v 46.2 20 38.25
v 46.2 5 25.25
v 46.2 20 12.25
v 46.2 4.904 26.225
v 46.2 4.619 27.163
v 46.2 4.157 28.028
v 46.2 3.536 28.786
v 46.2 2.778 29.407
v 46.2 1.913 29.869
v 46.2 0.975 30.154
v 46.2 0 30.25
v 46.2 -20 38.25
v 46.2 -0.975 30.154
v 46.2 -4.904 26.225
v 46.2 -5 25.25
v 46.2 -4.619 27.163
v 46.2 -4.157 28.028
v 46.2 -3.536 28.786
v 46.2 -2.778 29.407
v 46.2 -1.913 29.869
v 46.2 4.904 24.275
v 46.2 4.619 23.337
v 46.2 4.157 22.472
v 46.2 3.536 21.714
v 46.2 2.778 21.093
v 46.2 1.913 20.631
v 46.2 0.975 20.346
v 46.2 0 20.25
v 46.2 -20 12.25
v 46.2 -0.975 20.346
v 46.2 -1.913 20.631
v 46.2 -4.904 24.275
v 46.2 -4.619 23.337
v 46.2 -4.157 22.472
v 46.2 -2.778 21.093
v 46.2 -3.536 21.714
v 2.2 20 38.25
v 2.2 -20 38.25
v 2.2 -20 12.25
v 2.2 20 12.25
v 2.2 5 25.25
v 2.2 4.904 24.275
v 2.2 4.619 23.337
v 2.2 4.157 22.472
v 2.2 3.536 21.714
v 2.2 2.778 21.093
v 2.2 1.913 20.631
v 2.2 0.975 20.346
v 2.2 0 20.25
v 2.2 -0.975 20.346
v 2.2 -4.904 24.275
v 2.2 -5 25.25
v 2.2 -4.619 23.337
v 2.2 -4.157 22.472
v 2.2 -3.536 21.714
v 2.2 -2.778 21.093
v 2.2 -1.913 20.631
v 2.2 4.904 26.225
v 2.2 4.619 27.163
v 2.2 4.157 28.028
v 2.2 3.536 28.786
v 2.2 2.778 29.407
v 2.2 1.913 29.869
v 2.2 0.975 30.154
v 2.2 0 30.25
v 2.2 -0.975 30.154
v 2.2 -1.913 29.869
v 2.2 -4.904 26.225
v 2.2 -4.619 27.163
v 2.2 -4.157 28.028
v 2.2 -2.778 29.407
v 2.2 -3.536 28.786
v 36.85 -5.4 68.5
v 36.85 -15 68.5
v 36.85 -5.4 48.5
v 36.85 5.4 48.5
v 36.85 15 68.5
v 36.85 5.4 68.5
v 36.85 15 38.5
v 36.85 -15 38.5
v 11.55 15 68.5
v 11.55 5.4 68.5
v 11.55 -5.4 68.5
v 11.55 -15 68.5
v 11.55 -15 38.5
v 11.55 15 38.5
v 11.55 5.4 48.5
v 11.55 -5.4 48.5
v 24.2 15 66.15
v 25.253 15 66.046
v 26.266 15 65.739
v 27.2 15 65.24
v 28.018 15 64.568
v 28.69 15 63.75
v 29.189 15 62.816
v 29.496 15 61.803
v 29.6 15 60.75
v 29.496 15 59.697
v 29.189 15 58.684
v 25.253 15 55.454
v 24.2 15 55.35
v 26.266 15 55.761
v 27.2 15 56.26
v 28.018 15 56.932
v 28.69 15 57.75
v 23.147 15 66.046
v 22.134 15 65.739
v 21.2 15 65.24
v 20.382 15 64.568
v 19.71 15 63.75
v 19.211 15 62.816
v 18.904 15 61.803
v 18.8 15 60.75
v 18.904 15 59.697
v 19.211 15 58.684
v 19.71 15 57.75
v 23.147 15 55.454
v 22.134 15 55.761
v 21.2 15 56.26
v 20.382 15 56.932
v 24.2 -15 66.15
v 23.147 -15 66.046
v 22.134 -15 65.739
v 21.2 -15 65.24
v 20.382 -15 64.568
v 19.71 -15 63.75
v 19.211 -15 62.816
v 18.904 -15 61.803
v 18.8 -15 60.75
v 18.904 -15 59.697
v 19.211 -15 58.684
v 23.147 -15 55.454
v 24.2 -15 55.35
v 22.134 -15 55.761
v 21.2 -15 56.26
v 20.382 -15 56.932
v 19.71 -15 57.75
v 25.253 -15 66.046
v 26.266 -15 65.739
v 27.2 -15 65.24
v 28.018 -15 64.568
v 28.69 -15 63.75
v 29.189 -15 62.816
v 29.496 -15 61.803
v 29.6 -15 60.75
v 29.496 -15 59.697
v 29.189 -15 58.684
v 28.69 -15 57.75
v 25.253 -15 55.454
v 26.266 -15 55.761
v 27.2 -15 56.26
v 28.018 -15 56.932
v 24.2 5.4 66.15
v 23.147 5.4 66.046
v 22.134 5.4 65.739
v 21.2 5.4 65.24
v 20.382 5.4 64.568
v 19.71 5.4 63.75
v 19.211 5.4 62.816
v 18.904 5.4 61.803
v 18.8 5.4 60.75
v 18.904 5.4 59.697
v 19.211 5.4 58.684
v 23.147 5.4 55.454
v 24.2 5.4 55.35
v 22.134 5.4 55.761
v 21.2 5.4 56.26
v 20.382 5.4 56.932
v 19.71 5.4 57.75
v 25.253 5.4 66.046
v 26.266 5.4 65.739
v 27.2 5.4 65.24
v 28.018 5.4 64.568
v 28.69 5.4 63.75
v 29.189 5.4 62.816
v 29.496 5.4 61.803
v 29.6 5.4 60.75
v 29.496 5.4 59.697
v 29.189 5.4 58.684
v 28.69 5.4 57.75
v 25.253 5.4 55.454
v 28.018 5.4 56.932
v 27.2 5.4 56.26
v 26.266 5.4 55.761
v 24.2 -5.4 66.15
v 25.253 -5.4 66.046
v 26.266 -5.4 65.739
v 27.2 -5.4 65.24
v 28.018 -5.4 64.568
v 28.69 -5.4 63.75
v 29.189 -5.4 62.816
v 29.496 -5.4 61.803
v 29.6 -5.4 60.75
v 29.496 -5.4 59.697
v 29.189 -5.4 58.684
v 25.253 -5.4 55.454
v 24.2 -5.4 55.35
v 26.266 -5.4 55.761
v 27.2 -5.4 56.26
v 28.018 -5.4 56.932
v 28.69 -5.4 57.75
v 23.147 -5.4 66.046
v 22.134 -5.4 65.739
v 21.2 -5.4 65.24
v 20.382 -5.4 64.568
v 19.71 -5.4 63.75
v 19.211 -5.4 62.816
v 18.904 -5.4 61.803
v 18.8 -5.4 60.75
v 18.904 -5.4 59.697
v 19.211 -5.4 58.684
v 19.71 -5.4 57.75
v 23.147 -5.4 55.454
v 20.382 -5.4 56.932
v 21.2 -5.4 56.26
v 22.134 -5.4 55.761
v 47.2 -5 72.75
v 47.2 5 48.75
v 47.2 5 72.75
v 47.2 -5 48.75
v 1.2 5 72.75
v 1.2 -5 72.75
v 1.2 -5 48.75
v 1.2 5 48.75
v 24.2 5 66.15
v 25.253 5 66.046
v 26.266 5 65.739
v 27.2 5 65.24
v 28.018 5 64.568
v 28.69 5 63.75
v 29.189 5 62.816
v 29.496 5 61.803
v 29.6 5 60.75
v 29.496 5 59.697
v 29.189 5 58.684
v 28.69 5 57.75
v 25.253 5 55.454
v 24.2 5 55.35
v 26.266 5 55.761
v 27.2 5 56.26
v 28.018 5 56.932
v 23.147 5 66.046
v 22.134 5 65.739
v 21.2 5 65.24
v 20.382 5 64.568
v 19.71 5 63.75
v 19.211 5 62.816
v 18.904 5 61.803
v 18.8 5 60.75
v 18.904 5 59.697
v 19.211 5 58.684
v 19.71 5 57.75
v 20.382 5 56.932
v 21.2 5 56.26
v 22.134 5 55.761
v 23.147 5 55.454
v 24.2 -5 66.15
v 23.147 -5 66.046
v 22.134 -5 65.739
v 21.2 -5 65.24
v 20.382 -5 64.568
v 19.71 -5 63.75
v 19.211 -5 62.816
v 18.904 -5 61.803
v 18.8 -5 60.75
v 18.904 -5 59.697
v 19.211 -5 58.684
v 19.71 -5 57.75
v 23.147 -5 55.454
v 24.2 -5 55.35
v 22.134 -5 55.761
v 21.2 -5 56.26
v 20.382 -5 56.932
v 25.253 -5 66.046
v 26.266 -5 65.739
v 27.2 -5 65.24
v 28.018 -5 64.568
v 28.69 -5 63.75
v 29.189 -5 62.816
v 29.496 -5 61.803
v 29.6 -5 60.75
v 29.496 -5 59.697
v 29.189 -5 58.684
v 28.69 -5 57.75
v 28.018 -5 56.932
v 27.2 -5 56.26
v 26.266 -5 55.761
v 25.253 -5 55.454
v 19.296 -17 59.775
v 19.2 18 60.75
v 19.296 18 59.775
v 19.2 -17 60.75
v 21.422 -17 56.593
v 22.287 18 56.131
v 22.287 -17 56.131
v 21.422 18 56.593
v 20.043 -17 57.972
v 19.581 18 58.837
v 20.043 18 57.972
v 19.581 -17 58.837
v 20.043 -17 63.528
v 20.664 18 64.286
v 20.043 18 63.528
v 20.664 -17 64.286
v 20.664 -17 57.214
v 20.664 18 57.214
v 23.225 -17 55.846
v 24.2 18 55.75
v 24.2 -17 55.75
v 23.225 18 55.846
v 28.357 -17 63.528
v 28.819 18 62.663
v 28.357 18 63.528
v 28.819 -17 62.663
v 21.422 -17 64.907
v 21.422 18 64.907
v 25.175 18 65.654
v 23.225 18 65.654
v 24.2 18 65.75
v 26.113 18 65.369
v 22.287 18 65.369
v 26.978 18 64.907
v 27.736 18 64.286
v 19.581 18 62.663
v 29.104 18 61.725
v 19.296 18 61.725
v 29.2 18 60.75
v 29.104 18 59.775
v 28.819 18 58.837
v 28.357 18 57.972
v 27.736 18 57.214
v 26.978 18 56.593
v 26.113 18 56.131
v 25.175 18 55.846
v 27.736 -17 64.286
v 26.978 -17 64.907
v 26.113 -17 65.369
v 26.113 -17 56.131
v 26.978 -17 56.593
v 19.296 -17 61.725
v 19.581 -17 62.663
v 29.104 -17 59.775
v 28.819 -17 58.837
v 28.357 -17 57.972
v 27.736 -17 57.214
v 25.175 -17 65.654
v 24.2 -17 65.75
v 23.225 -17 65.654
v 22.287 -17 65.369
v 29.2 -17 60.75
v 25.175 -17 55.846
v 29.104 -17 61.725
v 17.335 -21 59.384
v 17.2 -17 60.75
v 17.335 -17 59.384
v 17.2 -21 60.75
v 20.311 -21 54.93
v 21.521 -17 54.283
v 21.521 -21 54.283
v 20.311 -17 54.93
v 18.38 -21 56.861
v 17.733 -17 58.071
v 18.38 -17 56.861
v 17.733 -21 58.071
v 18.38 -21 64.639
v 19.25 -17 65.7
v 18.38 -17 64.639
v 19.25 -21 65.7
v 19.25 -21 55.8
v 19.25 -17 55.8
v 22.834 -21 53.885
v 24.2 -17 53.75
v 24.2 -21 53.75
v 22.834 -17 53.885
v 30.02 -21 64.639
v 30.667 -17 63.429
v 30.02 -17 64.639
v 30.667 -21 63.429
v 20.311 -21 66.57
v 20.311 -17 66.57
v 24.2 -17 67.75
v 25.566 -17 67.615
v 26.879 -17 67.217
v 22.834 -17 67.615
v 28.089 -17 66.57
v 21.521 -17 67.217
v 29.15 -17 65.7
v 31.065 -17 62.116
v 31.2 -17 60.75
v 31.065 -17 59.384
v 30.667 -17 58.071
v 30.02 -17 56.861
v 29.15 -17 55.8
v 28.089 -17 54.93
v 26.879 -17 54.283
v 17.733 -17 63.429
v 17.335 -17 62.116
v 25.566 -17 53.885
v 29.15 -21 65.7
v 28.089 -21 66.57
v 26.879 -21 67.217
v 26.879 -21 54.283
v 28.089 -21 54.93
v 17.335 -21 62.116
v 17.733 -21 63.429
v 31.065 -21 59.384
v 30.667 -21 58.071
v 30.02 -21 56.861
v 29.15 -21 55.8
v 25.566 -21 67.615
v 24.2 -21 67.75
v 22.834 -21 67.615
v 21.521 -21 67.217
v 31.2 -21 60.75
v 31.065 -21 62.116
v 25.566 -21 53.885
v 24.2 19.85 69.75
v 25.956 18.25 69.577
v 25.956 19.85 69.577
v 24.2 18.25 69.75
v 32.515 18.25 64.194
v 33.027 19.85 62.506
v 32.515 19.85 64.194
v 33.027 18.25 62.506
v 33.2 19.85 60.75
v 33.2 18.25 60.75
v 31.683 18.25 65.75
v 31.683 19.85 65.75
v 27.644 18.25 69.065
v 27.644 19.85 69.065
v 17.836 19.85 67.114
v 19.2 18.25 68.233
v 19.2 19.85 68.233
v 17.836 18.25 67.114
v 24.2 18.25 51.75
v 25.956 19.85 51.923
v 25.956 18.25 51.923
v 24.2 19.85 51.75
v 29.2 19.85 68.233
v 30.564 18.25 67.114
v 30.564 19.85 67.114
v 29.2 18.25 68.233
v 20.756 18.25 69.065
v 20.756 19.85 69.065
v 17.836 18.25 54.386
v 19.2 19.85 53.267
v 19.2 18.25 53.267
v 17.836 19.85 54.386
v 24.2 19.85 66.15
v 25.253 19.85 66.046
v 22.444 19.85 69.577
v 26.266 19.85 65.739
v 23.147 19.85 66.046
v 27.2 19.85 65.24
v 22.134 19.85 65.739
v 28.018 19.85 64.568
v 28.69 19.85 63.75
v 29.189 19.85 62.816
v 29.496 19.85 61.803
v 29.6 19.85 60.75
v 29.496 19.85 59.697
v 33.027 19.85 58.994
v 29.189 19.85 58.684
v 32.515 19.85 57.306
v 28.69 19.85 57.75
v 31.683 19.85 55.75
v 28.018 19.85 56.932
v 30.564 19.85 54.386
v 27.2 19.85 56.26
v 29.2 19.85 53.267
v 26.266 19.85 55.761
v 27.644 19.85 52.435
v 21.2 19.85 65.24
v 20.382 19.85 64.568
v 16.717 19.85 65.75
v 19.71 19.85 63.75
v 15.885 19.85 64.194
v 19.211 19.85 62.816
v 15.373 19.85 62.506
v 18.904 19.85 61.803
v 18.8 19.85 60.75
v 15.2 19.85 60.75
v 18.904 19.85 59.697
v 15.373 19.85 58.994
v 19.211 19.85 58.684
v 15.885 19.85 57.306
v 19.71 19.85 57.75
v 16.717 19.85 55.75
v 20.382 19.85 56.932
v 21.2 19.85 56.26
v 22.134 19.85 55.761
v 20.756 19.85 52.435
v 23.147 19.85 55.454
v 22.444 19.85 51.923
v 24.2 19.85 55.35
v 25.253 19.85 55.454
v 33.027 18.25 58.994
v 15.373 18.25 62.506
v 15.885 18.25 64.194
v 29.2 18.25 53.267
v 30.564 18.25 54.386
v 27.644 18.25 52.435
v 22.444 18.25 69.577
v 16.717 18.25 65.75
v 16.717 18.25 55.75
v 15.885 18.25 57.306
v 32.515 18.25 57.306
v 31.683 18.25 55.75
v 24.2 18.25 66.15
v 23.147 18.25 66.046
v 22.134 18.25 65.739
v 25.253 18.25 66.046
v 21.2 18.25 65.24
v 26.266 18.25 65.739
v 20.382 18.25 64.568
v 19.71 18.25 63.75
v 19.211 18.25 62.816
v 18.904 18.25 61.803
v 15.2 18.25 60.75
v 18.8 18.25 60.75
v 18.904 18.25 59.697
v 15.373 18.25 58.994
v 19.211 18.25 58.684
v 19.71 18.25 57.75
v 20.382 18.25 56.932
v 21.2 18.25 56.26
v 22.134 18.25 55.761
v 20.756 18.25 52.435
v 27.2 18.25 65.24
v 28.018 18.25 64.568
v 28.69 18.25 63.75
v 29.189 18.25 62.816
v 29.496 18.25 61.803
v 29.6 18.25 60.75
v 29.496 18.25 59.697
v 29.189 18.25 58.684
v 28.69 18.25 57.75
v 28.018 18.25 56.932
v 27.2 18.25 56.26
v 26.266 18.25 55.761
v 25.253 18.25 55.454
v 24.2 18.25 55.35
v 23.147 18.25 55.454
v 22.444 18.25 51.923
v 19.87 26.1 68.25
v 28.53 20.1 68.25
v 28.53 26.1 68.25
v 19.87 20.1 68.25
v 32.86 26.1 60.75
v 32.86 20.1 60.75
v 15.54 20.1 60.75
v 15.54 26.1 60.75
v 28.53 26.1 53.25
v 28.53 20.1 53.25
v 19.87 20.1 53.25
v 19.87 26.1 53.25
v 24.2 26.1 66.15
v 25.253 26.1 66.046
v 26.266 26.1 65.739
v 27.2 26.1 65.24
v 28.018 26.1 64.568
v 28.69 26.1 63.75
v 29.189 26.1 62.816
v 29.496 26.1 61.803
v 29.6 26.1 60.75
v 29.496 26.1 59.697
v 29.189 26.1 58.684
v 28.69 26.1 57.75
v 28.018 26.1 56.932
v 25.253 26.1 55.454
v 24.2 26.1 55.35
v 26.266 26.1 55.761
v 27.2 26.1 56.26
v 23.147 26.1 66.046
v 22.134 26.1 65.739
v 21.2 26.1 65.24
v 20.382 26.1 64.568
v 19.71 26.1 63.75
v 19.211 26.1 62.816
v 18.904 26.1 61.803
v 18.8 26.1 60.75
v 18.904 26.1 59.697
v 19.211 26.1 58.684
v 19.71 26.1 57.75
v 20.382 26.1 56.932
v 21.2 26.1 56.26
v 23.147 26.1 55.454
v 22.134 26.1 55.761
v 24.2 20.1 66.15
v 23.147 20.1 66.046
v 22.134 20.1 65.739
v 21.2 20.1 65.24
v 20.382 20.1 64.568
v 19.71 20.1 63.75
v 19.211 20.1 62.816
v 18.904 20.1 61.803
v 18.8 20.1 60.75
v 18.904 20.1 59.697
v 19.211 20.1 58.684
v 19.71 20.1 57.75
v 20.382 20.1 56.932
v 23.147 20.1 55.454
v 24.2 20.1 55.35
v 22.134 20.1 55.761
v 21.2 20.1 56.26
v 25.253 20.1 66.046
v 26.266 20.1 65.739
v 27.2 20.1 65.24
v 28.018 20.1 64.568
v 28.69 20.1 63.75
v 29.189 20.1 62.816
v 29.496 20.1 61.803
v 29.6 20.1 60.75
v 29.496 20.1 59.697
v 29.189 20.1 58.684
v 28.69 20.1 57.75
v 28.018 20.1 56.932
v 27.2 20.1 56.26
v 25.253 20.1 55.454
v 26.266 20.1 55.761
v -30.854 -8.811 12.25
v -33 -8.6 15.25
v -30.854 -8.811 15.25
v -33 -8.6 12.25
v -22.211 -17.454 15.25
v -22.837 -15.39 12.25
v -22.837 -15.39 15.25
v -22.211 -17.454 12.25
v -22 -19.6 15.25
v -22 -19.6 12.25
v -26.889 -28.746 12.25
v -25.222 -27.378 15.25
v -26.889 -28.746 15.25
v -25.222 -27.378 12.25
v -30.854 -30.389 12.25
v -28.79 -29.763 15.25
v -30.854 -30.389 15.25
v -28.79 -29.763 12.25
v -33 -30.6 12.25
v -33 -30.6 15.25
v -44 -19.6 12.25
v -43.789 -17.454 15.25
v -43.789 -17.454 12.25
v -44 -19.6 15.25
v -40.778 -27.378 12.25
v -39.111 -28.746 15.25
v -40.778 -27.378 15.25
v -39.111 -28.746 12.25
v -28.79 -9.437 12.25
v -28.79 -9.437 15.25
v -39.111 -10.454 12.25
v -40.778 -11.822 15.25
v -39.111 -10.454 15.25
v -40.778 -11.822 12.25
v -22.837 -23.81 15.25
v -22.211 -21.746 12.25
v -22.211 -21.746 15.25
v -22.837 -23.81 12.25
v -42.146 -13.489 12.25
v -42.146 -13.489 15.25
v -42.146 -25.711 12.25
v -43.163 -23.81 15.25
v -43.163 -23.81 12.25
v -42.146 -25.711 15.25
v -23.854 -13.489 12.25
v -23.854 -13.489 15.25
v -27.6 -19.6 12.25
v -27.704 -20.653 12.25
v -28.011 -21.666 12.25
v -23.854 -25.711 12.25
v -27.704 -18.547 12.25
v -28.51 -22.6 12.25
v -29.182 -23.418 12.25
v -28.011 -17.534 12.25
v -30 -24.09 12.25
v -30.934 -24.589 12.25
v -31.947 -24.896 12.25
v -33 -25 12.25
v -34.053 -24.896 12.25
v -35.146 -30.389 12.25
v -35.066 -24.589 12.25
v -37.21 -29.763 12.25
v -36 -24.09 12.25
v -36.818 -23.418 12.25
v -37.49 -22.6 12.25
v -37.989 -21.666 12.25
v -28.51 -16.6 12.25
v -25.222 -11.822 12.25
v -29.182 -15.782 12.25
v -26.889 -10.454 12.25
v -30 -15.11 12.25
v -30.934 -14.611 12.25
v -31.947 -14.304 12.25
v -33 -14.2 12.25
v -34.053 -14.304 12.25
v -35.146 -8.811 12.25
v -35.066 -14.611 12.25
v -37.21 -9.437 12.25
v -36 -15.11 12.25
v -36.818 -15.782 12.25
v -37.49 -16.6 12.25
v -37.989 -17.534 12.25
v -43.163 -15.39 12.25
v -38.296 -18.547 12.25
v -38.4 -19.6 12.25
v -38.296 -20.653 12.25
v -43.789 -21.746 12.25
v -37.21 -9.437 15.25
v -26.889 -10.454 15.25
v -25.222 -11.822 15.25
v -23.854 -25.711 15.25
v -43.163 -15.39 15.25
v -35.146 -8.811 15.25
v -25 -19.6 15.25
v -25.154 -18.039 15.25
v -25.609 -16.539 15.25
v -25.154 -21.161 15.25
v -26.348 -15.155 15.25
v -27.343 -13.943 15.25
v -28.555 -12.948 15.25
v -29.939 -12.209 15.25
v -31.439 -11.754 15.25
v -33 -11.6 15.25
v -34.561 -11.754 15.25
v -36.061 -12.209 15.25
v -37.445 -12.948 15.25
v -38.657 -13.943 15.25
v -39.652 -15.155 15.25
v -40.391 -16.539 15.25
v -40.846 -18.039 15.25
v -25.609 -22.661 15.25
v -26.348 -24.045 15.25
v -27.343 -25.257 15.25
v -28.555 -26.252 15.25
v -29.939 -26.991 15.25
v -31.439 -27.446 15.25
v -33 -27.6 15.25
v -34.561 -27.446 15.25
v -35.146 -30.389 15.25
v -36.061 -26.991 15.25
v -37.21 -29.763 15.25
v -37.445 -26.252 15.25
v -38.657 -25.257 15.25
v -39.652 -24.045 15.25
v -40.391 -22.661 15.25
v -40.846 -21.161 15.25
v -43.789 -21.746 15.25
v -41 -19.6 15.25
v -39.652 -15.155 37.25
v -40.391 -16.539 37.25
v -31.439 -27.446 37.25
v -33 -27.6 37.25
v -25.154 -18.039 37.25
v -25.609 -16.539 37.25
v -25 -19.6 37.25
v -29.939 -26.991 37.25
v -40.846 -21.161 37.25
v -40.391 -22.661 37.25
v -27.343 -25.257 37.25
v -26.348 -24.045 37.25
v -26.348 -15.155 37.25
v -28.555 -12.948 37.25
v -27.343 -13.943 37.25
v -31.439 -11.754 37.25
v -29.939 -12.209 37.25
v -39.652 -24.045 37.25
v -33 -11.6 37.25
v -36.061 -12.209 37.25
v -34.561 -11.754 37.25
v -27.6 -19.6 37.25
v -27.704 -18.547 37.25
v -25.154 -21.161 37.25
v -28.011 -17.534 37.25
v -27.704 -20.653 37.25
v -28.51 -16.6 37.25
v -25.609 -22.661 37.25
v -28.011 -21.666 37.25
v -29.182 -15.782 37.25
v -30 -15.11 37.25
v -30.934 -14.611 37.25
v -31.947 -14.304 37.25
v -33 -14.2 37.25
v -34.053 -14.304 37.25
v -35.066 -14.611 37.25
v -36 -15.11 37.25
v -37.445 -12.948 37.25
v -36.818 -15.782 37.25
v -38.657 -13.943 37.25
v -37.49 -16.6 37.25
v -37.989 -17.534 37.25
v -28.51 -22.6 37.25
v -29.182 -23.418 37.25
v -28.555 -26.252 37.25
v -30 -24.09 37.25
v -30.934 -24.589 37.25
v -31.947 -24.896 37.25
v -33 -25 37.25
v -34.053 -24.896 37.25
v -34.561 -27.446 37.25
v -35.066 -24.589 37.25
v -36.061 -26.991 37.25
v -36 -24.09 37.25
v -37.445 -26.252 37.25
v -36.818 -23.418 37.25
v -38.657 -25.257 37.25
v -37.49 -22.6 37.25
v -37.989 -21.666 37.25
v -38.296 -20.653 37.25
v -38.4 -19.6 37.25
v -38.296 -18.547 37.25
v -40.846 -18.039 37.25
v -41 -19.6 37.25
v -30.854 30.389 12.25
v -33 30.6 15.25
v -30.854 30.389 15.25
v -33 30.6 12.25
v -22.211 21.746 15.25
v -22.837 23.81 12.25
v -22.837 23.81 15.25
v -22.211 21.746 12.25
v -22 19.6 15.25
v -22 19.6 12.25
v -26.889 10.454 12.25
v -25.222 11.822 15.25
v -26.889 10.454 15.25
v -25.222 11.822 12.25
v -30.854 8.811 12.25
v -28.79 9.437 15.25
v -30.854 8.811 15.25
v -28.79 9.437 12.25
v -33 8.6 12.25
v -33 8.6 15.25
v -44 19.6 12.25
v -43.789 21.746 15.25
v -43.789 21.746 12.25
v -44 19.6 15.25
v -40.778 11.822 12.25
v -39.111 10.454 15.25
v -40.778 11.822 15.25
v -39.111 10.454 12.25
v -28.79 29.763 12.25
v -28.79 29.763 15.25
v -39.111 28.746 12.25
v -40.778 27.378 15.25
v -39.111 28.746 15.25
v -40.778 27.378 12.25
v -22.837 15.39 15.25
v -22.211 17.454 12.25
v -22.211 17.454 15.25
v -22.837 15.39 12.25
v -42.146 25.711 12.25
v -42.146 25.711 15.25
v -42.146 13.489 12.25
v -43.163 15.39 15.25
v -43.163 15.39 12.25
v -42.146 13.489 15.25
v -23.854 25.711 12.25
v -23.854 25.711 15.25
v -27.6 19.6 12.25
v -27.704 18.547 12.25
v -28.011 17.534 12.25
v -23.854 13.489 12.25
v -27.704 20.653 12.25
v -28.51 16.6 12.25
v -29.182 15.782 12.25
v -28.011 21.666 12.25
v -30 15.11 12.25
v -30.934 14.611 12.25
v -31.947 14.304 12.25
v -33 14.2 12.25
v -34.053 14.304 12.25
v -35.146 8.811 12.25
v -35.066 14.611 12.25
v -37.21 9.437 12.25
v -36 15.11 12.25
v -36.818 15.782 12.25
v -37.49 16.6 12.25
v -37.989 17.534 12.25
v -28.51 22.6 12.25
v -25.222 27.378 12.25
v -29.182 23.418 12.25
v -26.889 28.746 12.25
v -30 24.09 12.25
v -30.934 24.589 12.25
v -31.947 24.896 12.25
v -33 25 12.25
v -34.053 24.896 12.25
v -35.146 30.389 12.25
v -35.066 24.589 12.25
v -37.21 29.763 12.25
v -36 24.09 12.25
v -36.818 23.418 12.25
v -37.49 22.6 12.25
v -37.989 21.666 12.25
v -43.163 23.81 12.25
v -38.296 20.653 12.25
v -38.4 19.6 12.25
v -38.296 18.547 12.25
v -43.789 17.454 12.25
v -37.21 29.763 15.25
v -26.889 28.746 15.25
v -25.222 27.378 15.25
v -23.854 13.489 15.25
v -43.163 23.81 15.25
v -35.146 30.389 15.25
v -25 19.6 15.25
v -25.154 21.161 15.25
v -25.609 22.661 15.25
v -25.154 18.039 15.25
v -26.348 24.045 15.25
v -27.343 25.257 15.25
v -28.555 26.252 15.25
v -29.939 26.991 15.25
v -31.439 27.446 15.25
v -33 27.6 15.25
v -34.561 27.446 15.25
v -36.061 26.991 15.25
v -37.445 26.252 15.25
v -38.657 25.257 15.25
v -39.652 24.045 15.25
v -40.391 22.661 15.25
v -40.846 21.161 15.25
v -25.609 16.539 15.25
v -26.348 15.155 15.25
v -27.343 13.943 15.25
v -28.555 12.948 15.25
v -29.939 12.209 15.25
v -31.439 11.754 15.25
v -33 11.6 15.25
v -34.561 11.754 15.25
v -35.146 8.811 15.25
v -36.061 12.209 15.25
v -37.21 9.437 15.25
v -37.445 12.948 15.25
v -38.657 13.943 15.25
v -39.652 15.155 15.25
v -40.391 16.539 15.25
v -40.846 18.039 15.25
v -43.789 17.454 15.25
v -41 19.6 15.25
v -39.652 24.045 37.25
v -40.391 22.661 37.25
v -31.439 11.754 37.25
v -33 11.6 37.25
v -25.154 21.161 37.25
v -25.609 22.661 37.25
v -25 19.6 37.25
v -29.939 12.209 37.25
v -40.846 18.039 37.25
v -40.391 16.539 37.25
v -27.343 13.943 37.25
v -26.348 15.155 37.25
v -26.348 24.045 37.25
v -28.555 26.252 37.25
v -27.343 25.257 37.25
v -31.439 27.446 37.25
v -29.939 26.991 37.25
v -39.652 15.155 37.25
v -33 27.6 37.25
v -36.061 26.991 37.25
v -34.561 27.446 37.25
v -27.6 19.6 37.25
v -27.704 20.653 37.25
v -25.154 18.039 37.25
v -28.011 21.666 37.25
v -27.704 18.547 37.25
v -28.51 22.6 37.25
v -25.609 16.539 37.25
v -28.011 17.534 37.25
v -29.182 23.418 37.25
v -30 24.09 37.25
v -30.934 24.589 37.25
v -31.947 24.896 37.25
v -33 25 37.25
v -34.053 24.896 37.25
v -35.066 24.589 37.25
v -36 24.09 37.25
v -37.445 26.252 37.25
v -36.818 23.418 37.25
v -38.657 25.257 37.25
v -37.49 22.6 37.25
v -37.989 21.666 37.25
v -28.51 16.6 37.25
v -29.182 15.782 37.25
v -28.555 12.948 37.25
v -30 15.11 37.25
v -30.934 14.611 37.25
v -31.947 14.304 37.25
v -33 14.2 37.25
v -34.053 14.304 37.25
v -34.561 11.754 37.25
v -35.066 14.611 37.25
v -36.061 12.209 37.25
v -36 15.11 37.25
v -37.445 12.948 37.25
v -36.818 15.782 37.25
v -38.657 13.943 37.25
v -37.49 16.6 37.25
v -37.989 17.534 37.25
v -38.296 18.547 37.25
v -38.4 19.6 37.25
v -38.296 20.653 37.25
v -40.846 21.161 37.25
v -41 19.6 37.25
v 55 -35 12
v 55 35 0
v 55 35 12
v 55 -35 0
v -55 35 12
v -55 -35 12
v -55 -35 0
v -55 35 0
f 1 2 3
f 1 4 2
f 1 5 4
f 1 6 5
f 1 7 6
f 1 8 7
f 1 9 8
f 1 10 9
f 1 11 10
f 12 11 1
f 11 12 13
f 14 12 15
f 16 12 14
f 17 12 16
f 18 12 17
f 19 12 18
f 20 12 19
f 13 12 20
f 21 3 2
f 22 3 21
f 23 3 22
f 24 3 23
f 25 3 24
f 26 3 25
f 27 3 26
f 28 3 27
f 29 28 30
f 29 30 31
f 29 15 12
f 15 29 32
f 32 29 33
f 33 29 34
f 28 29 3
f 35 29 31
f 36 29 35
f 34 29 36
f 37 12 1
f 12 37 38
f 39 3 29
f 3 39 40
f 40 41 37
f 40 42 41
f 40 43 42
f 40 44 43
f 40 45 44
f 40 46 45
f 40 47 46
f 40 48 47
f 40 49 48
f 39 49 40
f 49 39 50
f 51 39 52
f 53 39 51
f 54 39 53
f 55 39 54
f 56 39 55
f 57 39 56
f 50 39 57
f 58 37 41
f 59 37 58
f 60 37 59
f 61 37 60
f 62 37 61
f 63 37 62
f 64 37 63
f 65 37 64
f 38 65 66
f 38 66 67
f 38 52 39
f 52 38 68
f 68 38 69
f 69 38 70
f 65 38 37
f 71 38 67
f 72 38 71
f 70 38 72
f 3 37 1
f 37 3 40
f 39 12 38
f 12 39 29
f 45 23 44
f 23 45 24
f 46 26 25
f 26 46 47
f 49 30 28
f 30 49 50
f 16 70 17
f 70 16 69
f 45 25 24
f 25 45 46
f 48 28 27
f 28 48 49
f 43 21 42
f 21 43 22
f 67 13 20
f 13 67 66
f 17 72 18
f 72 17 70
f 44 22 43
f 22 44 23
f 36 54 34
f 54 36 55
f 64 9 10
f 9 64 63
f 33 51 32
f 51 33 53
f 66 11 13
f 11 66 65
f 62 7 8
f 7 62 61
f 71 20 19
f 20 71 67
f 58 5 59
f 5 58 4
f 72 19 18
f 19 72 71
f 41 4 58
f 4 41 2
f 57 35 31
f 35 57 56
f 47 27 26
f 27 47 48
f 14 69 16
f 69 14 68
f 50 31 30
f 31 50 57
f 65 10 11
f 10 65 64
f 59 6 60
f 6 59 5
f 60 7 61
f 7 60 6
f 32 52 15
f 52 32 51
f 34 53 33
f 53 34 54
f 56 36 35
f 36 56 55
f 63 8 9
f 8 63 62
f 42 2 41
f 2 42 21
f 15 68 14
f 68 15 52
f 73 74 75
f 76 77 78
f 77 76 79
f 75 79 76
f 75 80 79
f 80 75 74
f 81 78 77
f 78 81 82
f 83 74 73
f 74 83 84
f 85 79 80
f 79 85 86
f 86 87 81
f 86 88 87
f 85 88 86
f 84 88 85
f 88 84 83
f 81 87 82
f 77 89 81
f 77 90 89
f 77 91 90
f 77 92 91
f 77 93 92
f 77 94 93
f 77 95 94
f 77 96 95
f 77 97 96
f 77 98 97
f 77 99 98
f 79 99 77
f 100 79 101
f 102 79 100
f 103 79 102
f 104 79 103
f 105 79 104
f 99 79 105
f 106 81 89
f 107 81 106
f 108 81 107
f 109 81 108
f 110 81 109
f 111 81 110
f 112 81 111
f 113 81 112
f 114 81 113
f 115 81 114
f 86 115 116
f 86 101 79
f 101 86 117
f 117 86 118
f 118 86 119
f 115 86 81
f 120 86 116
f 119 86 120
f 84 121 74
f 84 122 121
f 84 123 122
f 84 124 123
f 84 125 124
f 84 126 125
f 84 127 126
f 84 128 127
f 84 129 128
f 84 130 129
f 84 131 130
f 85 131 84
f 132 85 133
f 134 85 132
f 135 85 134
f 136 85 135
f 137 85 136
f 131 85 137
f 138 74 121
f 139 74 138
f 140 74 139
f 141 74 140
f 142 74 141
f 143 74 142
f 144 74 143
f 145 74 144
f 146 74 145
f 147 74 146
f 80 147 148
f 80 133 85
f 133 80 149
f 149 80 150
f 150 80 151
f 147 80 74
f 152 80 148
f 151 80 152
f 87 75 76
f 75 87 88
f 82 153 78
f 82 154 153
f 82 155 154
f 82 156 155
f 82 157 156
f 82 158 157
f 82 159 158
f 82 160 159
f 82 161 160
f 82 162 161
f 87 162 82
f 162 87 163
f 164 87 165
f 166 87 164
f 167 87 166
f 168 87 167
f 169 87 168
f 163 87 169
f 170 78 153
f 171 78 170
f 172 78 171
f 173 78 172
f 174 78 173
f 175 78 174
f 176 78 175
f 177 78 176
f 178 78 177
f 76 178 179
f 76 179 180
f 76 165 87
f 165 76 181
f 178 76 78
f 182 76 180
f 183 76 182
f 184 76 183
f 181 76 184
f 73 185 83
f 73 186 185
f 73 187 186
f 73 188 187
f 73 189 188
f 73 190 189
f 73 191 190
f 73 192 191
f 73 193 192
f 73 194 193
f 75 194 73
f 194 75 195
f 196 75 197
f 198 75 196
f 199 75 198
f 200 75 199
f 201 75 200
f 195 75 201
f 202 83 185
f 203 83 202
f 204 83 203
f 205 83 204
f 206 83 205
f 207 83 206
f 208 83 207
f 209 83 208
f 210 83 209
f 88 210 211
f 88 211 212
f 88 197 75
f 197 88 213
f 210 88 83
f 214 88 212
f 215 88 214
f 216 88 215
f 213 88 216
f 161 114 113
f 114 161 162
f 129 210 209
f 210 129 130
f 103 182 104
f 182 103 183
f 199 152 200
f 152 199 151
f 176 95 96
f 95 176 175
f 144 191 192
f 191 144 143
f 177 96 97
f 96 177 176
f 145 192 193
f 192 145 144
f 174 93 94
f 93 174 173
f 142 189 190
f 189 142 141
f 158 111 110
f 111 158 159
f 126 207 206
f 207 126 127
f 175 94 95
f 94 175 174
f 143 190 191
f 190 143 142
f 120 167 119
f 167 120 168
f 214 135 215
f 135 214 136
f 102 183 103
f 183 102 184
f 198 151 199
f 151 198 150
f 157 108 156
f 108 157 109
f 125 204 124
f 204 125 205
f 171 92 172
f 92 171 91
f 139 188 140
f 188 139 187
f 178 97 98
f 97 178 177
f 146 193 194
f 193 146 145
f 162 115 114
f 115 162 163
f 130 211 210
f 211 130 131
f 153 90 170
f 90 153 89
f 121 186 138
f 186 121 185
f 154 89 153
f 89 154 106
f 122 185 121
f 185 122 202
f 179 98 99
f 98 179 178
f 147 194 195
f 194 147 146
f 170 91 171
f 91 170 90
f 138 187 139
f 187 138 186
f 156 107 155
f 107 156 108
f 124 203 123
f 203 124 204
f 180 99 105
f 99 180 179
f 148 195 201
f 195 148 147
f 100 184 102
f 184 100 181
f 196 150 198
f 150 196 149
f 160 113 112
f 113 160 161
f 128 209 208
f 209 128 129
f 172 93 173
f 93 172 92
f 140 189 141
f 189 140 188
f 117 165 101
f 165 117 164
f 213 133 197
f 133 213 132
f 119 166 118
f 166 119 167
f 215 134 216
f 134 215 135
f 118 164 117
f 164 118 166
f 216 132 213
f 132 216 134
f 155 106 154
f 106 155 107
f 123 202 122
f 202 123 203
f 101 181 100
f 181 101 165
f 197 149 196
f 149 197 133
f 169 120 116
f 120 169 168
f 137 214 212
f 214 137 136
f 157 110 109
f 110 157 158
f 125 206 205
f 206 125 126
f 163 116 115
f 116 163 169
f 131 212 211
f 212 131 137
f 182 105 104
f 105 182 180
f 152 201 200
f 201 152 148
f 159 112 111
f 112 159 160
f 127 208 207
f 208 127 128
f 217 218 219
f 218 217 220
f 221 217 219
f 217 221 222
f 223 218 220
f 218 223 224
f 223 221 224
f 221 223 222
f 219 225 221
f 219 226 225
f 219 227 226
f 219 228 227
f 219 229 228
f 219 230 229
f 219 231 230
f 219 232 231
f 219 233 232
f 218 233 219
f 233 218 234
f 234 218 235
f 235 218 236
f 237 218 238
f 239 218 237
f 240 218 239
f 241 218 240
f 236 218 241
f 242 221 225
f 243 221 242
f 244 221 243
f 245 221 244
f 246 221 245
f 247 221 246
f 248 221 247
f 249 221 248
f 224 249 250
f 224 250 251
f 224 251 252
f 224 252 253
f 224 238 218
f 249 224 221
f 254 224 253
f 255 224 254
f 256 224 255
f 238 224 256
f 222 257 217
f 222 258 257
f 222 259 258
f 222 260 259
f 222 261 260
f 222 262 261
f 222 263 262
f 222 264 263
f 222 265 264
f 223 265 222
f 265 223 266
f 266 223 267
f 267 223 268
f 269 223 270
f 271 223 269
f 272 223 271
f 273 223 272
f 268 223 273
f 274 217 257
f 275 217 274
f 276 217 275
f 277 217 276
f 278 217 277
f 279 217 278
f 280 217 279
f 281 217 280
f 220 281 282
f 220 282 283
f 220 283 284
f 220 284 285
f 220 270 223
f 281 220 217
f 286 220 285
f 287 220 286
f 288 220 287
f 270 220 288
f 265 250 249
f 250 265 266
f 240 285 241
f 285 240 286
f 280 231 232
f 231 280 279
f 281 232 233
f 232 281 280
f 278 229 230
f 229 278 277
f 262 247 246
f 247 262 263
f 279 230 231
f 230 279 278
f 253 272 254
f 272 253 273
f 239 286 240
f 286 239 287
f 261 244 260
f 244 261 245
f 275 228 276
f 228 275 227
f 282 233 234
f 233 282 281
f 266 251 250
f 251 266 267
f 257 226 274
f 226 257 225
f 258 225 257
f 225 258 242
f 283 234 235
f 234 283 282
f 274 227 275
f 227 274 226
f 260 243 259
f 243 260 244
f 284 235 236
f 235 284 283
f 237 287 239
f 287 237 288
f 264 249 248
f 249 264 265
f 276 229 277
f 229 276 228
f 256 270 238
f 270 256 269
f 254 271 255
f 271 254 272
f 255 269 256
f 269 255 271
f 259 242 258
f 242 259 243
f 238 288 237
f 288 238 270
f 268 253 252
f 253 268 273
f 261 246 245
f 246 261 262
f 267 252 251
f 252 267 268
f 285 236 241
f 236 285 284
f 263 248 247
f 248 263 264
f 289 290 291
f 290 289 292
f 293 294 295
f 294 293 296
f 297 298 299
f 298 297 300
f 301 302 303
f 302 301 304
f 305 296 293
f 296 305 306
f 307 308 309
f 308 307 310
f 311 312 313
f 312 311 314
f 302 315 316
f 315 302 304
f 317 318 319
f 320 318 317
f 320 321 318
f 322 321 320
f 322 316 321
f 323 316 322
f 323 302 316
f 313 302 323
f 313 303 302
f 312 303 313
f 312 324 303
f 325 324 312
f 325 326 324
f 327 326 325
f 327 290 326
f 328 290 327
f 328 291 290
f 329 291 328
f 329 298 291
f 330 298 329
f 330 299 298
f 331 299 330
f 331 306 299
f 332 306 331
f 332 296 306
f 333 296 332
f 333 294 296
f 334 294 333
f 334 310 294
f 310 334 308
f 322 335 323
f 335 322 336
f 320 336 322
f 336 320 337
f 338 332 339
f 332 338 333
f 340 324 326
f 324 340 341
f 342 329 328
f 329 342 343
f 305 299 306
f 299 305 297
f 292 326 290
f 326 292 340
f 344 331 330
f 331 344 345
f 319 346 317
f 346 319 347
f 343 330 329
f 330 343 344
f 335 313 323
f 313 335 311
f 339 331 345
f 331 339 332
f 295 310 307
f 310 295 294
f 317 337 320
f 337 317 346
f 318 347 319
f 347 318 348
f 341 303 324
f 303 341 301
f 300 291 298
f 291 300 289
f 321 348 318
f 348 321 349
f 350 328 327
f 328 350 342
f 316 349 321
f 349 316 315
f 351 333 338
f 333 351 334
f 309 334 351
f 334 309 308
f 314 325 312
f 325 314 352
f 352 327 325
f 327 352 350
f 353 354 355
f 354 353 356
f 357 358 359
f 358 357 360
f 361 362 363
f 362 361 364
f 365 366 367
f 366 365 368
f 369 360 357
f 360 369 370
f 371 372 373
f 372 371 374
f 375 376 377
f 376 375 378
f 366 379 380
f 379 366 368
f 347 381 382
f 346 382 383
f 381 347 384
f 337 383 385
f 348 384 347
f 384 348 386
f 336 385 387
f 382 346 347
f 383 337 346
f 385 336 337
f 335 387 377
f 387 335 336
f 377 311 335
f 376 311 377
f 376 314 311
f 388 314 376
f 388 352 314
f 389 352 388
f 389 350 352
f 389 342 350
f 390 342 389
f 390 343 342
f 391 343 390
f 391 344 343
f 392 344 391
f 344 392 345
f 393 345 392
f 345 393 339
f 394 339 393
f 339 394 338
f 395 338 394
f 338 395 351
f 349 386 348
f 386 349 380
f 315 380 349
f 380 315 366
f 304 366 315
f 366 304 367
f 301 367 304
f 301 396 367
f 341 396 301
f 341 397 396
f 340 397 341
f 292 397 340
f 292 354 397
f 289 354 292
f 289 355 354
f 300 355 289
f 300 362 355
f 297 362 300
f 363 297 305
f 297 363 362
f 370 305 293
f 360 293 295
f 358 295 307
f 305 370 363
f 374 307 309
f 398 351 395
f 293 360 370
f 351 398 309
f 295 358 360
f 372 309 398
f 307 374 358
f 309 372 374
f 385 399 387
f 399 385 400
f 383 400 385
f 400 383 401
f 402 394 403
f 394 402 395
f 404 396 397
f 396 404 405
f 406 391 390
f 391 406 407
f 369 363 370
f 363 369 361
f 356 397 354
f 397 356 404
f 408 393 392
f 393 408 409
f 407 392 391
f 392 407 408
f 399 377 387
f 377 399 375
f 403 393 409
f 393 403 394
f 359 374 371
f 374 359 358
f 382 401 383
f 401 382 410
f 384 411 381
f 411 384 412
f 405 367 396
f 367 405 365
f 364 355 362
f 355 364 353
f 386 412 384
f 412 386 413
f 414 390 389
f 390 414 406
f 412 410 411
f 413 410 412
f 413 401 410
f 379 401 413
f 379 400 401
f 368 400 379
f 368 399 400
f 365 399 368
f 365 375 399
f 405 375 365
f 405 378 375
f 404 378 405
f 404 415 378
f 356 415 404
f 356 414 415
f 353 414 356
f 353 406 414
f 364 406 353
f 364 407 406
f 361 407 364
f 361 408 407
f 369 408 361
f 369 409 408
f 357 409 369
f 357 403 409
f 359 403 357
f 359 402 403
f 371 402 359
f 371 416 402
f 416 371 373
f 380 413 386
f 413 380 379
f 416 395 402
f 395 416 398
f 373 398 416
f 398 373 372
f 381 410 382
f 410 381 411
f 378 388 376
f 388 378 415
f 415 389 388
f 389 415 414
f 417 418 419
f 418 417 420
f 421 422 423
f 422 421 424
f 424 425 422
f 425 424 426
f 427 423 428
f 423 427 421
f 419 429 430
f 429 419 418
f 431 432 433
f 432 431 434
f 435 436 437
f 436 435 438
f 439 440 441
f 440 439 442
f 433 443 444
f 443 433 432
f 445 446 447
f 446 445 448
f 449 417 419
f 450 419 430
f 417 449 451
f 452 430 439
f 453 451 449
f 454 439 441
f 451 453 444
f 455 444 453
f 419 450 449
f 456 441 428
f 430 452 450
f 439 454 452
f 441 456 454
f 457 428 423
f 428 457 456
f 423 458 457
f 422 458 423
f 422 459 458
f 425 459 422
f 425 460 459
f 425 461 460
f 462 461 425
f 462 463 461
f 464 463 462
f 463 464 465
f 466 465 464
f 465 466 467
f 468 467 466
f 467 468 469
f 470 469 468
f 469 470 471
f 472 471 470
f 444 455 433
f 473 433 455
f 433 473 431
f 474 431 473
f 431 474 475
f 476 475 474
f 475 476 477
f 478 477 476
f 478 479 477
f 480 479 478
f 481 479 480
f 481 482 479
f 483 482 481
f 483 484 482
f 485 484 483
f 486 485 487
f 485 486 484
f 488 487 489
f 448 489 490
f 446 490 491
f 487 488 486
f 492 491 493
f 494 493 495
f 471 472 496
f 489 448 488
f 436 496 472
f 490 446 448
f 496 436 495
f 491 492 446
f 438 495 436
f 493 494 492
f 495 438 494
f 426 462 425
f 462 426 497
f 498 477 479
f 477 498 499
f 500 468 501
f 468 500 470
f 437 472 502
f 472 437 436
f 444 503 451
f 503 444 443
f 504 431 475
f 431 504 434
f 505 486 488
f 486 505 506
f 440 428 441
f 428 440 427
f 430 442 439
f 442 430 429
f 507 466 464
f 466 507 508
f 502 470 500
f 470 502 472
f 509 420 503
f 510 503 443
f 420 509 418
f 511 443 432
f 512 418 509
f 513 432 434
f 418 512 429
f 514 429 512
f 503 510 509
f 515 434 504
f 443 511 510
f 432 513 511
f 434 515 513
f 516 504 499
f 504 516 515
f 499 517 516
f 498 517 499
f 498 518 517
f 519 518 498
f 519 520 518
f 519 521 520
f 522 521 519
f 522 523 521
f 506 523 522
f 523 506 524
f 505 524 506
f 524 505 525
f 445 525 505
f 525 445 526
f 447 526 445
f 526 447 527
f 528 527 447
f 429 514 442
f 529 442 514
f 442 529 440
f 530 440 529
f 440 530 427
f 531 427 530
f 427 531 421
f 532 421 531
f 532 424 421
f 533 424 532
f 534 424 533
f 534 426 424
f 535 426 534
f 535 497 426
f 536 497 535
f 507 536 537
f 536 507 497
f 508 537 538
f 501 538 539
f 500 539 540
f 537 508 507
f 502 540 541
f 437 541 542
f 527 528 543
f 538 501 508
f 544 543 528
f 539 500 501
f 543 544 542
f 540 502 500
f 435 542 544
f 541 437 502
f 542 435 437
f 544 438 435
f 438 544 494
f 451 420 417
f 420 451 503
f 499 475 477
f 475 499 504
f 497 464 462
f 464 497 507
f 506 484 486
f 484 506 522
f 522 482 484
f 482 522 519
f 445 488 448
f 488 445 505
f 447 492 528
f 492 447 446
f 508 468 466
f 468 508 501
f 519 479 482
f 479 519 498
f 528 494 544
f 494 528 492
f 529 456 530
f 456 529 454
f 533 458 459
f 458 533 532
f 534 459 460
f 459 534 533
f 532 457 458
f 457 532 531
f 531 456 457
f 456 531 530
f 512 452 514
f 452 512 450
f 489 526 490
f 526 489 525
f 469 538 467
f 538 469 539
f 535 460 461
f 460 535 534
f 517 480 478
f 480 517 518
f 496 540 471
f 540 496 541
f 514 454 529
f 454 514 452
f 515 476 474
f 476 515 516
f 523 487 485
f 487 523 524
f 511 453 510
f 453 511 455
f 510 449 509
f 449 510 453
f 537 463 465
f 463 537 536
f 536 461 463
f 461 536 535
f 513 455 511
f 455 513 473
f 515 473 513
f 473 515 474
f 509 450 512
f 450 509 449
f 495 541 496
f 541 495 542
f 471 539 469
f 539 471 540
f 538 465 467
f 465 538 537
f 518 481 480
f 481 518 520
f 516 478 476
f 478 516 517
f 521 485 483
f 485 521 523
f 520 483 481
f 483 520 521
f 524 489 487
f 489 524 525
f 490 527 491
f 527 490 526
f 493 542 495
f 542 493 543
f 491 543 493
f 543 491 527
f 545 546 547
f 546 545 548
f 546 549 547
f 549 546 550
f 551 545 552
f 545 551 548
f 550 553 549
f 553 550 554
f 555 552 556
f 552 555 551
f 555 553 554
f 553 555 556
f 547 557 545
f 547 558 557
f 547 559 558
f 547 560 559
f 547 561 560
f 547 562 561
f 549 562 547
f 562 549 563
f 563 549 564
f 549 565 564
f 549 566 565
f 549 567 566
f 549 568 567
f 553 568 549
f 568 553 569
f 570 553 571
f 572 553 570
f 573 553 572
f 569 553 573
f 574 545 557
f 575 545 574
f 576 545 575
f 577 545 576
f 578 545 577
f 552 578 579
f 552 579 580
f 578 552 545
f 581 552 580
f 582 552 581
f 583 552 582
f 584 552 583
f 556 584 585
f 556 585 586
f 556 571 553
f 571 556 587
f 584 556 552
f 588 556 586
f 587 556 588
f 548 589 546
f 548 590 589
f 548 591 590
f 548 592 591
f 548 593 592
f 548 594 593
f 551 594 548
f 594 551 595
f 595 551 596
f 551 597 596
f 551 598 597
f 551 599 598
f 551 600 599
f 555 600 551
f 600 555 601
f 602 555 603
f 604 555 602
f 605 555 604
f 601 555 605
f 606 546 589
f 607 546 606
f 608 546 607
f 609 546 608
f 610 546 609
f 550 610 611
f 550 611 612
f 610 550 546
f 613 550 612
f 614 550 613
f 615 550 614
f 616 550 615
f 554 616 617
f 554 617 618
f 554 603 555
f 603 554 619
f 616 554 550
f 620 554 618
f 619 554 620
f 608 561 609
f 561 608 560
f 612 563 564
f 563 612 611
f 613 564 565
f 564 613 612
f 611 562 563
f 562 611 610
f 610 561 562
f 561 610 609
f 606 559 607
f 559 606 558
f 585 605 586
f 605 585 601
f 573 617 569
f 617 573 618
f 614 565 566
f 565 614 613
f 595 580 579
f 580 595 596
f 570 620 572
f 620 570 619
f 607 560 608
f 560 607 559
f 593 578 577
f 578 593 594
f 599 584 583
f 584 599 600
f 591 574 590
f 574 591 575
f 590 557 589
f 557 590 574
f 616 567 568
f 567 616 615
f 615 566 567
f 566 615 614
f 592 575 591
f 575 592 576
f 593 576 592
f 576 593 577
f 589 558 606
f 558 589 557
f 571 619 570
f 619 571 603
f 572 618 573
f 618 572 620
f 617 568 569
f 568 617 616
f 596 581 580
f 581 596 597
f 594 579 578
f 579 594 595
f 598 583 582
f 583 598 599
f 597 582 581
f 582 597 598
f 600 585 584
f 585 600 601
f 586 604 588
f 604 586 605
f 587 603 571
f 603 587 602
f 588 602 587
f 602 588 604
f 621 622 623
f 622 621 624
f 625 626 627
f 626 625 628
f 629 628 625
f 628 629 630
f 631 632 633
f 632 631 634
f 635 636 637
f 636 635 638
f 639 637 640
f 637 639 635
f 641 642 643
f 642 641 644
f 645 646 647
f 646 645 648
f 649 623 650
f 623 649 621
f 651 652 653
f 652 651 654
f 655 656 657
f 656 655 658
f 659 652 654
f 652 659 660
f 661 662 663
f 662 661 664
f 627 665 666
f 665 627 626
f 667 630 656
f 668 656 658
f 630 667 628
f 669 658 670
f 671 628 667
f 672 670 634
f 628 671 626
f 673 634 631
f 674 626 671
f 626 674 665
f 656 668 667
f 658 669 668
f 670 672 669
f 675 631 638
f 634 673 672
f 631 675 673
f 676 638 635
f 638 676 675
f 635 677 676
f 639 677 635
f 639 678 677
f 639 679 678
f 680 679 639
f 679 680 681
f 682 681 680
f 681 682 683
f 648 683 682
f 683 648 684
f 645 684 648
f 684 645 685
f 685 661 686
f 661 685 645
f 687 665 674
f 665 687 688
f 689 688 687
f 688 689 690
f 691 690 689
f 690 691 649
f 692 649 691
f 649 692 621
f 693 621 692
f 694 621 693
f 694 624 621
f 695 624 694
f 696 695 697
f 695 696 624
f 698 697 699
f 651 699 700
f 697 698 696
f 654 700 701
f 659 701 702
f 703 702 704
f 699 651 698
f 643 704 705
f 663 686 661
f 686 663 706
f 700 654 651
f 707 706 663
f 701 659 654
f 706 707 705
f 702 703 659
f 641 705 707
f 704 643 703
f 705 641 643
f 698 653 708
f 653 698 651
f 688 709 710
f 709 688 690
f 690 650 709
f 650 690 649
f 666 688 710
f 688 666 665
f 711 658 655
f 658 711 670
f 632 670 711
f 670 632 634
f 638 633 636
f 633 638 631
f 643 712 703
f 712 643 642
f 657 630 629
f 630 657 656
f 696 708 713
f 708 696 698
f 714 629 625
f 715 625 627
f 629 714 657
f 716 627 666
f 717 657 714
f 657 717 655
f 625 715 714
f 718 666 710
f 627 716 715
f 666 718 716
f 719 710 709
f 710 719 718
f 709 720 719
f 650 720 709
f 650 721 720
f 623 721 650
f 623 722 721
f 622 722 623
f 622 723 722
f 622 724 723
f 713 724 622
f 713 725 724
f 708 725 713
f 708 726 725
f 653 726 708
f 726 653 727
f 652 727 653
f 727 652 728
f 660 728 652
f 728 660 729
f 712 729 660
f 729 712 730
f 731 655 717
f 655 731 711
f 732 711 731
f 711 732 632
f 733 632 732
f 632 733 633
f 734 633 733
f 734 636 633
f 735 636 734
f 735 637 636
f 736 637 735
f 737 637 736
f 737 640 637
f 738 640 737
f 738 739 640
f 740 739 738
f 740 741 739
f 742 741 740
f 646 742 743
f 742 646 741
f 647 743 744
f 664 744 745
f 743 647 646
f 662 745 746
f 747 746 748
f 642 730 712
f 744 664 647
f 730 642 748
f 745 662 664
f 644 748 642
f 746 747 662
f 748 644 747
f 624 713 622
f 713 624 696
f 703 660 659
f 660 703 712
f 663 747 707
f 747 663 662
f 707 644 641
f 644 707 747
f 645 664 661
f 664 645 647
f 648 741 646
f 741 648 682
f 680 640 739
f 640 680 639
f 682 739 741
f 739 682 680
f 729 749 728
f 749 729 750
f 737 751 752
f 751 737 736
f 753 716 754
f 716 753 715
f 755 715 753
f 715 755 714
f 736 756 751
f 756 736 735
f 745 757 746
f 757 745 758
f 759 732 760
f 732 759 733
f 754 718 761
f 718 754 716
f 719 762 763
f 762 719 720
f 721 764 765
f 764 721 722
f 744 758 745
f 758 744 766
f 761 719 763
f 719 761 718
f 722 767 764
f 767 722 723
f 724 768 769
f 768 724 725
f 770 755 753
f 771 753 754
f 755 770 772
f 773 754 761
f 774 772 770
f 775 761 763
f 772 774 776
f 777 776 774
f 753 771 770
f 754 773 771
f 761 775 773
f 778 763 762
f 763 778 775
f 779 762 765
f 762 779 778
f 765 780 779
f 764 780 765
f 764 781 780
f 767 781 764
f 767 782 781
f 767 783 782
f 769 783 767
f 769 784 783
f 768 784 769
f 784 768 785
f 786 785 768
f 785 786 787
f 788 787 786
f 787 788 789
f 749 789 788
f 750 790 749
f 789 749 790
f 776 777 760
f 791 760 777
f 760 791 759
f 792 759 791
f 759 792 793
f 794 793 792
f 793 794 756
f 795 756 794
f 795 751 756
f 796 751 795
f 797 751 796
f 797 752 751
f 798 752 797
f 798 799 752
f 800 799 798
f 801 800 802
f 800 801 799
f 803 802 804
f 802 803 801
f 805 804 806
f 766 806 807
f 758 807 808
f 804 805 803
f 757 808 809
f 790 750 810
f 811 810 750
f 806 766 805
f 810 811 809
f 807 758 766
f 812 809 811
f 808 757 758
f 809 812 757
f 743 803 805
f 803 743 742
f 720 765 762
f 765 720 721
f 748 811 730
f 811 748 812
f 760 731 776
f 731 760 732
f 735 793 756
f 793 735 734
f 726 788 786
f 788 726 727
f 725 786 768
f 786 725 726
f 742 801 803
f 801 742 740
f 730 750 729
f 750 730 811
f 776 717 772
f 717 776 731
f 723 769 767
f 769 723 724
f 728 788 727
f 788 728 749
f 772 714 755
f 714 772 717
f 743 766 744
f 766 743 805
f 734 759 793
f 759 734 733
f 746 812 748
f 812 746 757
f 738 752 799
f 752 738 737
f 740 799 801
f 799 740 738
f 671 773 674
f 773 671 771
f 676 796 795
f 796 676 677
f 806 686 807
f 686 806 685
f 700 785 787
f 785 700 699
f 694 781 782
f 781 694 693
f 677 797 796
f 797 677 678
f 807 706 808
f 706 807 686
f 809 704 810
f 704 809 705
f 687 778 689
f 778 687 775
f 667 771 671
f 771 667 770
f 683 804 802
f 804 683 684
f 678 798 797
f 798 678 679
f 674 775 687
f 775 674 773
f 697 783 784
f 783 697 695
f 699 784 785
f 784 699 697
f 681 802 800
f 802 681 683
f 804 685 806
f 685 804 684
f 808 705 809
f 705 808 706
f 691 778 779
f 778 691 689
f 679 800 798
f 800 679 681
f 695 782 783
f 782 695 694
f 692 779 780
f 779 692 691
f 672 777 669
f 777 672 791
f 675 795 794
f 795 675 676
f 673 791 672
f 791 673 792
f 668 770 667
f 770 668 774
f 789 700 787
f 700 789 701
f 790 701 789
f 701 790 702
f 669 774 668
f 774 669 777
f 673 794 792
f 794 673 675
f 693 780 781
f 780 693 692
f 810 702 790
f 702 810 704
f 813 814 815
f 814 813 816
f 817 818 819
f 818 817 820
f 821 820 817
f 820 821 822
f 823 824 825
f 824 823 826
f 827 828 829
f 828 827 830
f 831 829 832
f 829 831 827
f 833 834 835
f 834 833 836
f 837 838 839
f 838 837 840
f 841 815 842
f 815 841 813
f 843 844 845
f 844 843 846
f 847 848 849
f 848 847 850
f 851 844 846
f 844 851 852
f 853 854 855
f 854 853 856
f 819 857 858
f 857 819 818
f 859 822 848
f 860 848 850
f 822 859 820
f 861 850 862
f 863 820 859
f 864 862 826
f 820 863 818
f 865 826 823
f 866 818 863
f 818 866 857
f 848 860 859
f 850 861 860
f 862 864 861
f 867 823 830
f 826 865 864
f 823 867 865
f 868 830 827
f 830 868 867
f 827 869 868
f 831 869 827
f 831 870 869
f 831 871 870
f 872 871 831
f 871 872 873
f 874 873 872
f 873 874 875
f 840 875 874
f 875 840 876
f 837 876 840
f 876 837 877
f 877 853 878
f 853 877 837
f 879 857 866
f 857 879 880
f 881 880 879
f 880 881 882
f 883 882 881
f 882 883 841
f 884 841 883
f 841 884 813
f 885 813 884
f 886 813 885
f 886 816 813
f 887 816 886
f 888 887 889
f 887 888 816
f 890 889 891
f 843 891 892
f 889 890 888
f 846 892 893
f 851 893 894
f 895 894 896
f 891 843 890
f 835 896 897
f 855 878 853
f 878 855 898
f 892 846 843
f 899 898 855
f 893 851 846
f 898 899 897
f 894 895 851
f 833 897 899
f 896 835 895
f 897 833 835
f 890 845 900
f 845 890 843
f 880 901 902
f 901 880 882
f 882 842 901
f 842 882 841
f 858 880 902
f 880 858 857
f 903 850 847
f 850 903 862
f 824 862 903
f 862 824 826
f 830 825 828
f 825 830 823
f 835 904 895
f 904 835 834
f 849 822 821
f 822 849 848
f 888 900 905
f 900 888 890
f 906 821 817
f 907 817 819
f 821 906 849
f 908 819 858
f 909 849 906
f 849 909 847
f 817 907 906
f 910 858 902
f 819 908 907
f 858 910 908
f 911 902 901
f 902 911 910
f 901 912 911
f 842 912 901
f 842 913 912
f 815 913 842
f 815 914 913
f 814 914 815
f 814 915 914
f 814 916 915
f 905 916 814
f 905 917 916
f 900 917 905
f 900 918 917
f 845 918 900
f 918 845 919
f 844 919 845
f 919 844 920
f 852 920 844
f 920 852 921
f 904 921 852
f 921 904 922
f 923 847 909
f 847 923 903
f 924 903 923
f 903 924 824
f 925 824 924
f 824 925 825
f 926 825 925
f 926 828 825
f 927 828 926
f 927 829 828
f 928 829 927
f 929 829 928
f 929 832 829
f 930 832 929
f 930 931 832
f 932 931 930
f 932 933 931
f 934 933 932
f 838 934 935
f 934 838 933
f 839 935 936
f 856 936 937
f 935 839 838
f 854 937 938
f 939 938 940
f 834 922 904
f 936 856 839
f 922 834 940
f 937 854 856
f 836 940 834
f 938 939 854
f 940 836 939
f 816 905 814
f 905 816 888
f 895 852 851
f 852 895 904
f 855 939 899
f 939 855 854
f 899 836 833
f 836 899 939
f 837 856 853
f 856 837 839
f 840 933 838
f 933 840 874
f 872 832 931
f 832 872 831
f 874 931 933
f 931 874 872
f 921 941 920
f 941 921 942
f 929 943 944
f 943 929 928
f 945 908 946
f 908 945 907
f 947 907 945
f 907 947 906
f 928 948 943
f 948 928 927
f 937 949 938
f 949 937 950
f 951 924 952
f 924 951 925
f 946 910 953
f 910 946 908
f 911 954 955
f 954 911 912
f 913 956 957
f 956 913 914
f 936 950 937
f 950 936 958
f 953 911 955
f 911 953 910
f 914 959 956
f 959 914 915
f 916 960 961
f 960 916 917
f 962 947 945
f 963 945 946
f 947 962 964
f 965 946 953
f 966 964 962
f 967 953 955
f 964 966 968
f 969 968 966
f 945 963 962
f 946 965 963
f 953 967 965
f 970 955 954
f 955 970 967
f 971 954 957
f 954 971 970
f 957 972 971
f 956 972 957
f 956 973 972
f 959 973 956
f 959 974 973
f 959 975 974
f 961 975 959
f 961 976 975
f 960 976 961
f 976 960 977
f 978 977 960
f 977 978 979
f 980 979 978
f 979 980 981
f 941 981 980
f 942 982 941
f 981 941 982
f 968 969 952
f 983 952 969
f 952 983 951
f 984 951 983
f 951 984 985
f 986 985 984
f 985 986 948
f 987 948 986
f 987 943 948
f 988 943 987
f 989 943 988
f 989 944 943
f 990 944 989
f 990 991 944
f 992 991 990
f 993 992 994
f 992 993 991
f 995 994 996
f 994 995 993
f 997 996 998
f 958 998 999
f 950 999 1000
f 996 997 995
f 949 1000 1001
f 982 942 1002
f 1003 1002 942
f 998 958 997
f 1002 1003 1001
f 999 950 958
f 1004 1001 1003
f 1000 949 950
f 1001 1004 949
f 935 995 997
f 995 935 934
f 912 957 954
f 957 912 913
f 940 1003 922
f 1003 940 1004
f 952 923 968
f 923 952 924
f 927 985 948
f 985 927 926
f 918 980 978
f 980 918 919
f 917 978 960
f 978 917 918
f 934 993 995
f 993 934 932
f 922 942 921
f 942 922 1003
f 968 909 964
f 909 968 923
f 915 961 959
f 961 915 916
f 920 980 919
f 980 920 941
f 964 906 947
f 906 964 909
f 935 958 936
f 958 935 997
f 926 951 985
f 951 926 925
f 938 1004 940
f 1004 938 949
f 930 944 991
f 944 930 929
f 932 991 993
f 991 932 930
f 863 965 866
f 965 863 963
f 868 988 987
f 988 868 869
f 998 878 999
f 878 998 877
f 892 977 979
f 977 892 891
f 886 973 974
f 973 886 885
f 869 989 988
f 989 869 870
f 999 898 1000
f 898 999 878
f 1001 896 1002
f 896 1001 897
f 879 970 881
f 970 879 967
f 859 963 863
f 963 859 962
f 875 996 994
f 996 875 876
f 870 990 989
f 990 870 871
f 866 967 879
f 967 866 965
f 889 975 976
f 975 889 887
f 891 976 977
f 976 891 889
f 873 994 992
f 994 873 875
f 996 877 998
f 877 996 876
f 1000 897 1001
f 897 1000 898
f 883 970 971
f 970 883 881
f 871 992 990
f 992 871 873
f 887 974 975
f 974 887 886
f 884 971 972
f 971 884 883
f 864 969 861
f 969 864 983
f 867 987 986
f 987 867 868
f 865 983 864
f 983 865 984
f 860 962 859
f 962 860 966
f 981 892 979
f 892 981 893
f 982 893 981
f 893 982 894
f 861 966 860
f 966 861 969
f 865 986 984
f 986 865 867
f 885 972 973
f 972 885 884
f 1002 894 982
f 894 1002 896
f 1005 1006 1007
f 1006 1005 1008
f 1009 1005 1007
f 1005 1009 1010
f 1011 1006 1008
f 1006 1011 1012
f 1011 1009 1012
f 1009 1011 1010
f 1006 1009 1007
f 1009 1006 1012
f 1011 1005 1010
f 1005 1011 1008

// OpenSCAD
$fn = 32;

// ------------------------------------------------------------------------
// Indexing jig: plate 110 x 70 mm, pin d10
// Every part is its own module, assembly() places every instance.
// ------------------------------------------------------------------------

// --- part 1 ---
module jig_plate() {
  difference() {
    translate([-55, -35, 0]) cube([110, 70, 12]);
  }
}

// --- part 2 ---
module locator_block() {
  difference() {
    translate([-22, -20, 0]) cube([44, 40, 26]);
    translate([0, 0, 13]) rotate([0, 90, 0]) cylinder(h = 46, d = 10, center = true);
  }
}

// --- part 3 ---
module index_fork() {
  difference() {
    translate([-12.65, -15, 0]) cube([25.3, 30, 30]);
    translate([-13.65, -5.4, 10]) cube([27.3, 10.8, 21]);
    translate([0, 0, 22.25]) rotate([90, 0, 0]) cylinder(h = 32, d = 10.8, center = true);
  }
}

// --- part 4 ---
module index_arm() {
  difference() {
    translate([-23, -5, 0]) cube([46, 10, 24]);
    translate([0, 0, 12]) rotate([90, 0, 0]) cylinder(h = 12, d = 10.8, center = true);
  }
}

// --- part 5 ---
module index_pin() {
  rotate([0, 90, 0]) cylinder(h = 36, d = 10, center = true);
  translate([-21, 0, 0]) rotate([0, 90, 0]) cylinder(h = 4, d = 14);
}

// --- part 6 ---
module pin_washer() {
  difference() {
      translate([0, 0, 0]) cylinder(h = 1.6, d = 18);
      translate([0, 0, -1]) cylinder(h = 3.6, d = 10.8);
    }
}

// --- part 7 ---
module lock_nut() {
  difference() {
    linear_extrude(height = 6) polygon(points = [[8.66, 0], [4.33, 7.5], [-4.33, 7.5], [-8.66, 0], [-4.33, -7.5], [4.33, -7.5]]);
    translate([0, 0, -1]) cylinder(h = 8, d = 10.8);
  }
}

// --- part 8 ---
module guide_bush_a() {
  difference() {
    union() {
      cylinder(h = 3, d = 22);
      translate([0, 0, 3]) cylinder(h = 22, d = 16);
    }
    translate([0, 0, -1]) cylinder(h = 27, d = 10.8);
  }
}

// --- part 9 ---
module guide_bush_b() {
  difference() {
    union() {
      cylinder(h = 3, d = 22);
      translate([0, 0, 3]) cylinder(h = 22, d = 16);
    }
    translate([0, 0, -1]) cylinder(h = 27, d = 10.8);
  }
}

// --- assembly ---
module assembly() {
  color([0.80, 0.24, 0.20]) translate([0, 0, 0]) rotate([0, 0, 0]) jig_plate();
  color([0.20, 0.45, 0.75]) translate([24.2, 0, 12.25]) rotate([0, 0, 0]) locator_block();
  color([0.25, 0.62, 0.32]) translate([24.2, 0, 38.5]) rotate([0, 0, 0]) index_fork();
  color([0.92, 0.70, 0.18]) translate([24.2, 0, 48.75]) rotate([0, 0, 0]) index_arm();
  color([0.58, 0.35, 0.70]) translate([24.2, 0, 60.75]) rotate([0, 0, 90]) index_pin();
  color([0.16, 0.66, 0.66]) translate([24.2, 19.85, 60.75]) rotate([90, 0, 0]) pin_washer();
  color([0.85, 0.48, 0.18]) translate([24.2, 26.1, 60.75]) rotate([90, 0, 0]) lock_nut();
  color([0.55, 0.60, 0.65]) translate([-33, -19.6, 12.25]) rotate([0, 0, 0]) guide_bush_a();
  color([0.75, 0.30, 0.55]) translate([-33, 19.6, 12.25]) rotate([0, 0, 0]) guide_bush_b();
}

assembly();
